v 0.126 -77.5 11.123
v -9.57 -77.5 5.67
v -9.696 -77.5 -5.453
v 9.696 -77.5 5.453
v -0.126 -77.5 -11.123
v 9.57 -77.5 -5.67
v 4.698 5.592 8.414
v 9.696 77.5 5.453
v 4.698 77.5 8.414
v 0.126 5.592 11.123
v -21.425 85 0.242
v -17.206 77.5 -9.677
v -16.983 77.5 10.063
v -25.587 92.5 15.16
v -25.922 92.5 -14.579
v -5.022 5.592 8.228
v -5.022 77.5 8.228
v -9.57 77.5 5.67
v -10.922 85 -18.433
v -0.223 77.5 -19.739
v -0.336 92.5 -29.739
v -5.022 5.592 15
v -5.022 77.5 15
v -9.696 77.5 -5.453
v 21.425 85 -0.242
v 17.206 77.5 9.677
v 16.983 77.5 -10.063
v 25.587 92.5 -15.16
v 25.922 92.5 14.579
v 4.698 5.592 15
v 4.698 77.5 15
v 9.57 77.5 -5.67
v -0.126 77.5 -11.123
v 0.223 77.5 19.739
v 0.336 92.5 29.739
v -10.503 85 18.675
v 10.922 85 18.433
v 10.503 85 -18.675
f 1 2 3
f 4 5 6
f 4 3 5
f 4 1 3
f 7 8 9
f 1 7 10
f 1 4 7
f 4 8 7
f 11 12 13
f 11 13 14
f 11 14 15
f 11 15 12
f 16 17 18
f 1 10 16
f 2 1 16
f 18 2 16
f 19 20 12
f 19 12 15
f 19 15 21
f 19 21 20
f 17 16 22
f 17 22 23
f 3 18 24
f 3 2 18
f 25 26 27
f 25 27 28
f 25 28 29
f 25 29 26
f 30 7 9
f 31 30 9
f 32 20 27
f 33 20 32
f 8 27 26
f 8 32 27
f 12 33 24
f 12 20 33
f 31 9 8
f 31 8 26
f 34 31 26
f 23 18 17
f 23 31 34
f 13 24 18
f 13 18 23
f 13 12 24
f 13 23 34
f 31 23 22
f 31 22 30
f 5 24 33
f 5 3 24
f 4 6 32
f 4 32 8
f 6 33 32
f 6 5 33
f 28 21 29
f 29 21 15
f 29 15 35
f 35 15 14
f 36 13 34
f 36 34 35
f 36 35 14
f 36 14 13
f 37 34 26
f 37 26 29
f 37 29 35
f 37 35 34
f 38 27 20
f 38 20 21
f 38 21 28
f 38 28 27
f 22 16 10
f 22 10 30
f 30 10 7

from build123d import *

# Parameters (mm, degrees)
F1_DEPTH = 77.5
F3_DEPTH = 15
F3_TAPER = -30
F4_W     = 9.7201652825
F4_H     = 81.3968237489
F5_DEPTH = 15


with BuildPart() as f1:
    # F0 (on Front) → F1 (new body, symmetric)
    with BuildSketch(Plane.XZ):
        Polygon((-0.1256162198, -11.1232604972), (9.5702180536, -5.6704170861), (9.6958342734, 5.4528434111), (0.1256162198, 11.1232604972), (-9.5702180536, 5.6704170861), (-9.6958342734, -5.4528434111), align=None)
    extrude(amount=F1_DEPTH, both=True)

    # F2 (on face) → F3 (join)
    with BuildSketch(Plane(origin=(0, 77.5, 0), x_dir=(-1, 0, 0), z_dir=(0, 1, 0))):
        Polygon((0.2229186467, -19.7393472), (17.2062354526, -9.676620389), (16.983316806, 10.062726811), (-0.2229186467, 19.7393472), (-17.2062354526, 9.676620389), (-16.983316806, -10.062726811), align=None)
        Polygon((9.6958342734, -5.4528434111), (0.1256162198, -11.1232604972), (-9.5702180536, -5.6704170861), (-9.6958342734, 5.4528434111), (-0.1256162198, 11.1232604972), (9.5702180536, 5.6704170861), align=None, mode=Mode.SUBTRACT)
        Polygon((-9.5702180536, -5.6704170861), (0.1256162198, -11.1232604972), (9.6958342734, -5.4528434111), (9.5702180536, 5.6704170861), (-0.1256162198, 11.1232604972), (-9.6958342734, 5.4528434111), align=None)
    extrude(amount=F3_DEPTH, taper=F3_TAPER)

    # F4 (on Top) → F5 (join)
    with BuildSketch(Plane.XY):
        with Locations((-0.1620021649, 46.2903873995)):
            Rectangle(F4_W, F4_H)
    extrude(amount=F5_DEPTH)


solid = f1.part
